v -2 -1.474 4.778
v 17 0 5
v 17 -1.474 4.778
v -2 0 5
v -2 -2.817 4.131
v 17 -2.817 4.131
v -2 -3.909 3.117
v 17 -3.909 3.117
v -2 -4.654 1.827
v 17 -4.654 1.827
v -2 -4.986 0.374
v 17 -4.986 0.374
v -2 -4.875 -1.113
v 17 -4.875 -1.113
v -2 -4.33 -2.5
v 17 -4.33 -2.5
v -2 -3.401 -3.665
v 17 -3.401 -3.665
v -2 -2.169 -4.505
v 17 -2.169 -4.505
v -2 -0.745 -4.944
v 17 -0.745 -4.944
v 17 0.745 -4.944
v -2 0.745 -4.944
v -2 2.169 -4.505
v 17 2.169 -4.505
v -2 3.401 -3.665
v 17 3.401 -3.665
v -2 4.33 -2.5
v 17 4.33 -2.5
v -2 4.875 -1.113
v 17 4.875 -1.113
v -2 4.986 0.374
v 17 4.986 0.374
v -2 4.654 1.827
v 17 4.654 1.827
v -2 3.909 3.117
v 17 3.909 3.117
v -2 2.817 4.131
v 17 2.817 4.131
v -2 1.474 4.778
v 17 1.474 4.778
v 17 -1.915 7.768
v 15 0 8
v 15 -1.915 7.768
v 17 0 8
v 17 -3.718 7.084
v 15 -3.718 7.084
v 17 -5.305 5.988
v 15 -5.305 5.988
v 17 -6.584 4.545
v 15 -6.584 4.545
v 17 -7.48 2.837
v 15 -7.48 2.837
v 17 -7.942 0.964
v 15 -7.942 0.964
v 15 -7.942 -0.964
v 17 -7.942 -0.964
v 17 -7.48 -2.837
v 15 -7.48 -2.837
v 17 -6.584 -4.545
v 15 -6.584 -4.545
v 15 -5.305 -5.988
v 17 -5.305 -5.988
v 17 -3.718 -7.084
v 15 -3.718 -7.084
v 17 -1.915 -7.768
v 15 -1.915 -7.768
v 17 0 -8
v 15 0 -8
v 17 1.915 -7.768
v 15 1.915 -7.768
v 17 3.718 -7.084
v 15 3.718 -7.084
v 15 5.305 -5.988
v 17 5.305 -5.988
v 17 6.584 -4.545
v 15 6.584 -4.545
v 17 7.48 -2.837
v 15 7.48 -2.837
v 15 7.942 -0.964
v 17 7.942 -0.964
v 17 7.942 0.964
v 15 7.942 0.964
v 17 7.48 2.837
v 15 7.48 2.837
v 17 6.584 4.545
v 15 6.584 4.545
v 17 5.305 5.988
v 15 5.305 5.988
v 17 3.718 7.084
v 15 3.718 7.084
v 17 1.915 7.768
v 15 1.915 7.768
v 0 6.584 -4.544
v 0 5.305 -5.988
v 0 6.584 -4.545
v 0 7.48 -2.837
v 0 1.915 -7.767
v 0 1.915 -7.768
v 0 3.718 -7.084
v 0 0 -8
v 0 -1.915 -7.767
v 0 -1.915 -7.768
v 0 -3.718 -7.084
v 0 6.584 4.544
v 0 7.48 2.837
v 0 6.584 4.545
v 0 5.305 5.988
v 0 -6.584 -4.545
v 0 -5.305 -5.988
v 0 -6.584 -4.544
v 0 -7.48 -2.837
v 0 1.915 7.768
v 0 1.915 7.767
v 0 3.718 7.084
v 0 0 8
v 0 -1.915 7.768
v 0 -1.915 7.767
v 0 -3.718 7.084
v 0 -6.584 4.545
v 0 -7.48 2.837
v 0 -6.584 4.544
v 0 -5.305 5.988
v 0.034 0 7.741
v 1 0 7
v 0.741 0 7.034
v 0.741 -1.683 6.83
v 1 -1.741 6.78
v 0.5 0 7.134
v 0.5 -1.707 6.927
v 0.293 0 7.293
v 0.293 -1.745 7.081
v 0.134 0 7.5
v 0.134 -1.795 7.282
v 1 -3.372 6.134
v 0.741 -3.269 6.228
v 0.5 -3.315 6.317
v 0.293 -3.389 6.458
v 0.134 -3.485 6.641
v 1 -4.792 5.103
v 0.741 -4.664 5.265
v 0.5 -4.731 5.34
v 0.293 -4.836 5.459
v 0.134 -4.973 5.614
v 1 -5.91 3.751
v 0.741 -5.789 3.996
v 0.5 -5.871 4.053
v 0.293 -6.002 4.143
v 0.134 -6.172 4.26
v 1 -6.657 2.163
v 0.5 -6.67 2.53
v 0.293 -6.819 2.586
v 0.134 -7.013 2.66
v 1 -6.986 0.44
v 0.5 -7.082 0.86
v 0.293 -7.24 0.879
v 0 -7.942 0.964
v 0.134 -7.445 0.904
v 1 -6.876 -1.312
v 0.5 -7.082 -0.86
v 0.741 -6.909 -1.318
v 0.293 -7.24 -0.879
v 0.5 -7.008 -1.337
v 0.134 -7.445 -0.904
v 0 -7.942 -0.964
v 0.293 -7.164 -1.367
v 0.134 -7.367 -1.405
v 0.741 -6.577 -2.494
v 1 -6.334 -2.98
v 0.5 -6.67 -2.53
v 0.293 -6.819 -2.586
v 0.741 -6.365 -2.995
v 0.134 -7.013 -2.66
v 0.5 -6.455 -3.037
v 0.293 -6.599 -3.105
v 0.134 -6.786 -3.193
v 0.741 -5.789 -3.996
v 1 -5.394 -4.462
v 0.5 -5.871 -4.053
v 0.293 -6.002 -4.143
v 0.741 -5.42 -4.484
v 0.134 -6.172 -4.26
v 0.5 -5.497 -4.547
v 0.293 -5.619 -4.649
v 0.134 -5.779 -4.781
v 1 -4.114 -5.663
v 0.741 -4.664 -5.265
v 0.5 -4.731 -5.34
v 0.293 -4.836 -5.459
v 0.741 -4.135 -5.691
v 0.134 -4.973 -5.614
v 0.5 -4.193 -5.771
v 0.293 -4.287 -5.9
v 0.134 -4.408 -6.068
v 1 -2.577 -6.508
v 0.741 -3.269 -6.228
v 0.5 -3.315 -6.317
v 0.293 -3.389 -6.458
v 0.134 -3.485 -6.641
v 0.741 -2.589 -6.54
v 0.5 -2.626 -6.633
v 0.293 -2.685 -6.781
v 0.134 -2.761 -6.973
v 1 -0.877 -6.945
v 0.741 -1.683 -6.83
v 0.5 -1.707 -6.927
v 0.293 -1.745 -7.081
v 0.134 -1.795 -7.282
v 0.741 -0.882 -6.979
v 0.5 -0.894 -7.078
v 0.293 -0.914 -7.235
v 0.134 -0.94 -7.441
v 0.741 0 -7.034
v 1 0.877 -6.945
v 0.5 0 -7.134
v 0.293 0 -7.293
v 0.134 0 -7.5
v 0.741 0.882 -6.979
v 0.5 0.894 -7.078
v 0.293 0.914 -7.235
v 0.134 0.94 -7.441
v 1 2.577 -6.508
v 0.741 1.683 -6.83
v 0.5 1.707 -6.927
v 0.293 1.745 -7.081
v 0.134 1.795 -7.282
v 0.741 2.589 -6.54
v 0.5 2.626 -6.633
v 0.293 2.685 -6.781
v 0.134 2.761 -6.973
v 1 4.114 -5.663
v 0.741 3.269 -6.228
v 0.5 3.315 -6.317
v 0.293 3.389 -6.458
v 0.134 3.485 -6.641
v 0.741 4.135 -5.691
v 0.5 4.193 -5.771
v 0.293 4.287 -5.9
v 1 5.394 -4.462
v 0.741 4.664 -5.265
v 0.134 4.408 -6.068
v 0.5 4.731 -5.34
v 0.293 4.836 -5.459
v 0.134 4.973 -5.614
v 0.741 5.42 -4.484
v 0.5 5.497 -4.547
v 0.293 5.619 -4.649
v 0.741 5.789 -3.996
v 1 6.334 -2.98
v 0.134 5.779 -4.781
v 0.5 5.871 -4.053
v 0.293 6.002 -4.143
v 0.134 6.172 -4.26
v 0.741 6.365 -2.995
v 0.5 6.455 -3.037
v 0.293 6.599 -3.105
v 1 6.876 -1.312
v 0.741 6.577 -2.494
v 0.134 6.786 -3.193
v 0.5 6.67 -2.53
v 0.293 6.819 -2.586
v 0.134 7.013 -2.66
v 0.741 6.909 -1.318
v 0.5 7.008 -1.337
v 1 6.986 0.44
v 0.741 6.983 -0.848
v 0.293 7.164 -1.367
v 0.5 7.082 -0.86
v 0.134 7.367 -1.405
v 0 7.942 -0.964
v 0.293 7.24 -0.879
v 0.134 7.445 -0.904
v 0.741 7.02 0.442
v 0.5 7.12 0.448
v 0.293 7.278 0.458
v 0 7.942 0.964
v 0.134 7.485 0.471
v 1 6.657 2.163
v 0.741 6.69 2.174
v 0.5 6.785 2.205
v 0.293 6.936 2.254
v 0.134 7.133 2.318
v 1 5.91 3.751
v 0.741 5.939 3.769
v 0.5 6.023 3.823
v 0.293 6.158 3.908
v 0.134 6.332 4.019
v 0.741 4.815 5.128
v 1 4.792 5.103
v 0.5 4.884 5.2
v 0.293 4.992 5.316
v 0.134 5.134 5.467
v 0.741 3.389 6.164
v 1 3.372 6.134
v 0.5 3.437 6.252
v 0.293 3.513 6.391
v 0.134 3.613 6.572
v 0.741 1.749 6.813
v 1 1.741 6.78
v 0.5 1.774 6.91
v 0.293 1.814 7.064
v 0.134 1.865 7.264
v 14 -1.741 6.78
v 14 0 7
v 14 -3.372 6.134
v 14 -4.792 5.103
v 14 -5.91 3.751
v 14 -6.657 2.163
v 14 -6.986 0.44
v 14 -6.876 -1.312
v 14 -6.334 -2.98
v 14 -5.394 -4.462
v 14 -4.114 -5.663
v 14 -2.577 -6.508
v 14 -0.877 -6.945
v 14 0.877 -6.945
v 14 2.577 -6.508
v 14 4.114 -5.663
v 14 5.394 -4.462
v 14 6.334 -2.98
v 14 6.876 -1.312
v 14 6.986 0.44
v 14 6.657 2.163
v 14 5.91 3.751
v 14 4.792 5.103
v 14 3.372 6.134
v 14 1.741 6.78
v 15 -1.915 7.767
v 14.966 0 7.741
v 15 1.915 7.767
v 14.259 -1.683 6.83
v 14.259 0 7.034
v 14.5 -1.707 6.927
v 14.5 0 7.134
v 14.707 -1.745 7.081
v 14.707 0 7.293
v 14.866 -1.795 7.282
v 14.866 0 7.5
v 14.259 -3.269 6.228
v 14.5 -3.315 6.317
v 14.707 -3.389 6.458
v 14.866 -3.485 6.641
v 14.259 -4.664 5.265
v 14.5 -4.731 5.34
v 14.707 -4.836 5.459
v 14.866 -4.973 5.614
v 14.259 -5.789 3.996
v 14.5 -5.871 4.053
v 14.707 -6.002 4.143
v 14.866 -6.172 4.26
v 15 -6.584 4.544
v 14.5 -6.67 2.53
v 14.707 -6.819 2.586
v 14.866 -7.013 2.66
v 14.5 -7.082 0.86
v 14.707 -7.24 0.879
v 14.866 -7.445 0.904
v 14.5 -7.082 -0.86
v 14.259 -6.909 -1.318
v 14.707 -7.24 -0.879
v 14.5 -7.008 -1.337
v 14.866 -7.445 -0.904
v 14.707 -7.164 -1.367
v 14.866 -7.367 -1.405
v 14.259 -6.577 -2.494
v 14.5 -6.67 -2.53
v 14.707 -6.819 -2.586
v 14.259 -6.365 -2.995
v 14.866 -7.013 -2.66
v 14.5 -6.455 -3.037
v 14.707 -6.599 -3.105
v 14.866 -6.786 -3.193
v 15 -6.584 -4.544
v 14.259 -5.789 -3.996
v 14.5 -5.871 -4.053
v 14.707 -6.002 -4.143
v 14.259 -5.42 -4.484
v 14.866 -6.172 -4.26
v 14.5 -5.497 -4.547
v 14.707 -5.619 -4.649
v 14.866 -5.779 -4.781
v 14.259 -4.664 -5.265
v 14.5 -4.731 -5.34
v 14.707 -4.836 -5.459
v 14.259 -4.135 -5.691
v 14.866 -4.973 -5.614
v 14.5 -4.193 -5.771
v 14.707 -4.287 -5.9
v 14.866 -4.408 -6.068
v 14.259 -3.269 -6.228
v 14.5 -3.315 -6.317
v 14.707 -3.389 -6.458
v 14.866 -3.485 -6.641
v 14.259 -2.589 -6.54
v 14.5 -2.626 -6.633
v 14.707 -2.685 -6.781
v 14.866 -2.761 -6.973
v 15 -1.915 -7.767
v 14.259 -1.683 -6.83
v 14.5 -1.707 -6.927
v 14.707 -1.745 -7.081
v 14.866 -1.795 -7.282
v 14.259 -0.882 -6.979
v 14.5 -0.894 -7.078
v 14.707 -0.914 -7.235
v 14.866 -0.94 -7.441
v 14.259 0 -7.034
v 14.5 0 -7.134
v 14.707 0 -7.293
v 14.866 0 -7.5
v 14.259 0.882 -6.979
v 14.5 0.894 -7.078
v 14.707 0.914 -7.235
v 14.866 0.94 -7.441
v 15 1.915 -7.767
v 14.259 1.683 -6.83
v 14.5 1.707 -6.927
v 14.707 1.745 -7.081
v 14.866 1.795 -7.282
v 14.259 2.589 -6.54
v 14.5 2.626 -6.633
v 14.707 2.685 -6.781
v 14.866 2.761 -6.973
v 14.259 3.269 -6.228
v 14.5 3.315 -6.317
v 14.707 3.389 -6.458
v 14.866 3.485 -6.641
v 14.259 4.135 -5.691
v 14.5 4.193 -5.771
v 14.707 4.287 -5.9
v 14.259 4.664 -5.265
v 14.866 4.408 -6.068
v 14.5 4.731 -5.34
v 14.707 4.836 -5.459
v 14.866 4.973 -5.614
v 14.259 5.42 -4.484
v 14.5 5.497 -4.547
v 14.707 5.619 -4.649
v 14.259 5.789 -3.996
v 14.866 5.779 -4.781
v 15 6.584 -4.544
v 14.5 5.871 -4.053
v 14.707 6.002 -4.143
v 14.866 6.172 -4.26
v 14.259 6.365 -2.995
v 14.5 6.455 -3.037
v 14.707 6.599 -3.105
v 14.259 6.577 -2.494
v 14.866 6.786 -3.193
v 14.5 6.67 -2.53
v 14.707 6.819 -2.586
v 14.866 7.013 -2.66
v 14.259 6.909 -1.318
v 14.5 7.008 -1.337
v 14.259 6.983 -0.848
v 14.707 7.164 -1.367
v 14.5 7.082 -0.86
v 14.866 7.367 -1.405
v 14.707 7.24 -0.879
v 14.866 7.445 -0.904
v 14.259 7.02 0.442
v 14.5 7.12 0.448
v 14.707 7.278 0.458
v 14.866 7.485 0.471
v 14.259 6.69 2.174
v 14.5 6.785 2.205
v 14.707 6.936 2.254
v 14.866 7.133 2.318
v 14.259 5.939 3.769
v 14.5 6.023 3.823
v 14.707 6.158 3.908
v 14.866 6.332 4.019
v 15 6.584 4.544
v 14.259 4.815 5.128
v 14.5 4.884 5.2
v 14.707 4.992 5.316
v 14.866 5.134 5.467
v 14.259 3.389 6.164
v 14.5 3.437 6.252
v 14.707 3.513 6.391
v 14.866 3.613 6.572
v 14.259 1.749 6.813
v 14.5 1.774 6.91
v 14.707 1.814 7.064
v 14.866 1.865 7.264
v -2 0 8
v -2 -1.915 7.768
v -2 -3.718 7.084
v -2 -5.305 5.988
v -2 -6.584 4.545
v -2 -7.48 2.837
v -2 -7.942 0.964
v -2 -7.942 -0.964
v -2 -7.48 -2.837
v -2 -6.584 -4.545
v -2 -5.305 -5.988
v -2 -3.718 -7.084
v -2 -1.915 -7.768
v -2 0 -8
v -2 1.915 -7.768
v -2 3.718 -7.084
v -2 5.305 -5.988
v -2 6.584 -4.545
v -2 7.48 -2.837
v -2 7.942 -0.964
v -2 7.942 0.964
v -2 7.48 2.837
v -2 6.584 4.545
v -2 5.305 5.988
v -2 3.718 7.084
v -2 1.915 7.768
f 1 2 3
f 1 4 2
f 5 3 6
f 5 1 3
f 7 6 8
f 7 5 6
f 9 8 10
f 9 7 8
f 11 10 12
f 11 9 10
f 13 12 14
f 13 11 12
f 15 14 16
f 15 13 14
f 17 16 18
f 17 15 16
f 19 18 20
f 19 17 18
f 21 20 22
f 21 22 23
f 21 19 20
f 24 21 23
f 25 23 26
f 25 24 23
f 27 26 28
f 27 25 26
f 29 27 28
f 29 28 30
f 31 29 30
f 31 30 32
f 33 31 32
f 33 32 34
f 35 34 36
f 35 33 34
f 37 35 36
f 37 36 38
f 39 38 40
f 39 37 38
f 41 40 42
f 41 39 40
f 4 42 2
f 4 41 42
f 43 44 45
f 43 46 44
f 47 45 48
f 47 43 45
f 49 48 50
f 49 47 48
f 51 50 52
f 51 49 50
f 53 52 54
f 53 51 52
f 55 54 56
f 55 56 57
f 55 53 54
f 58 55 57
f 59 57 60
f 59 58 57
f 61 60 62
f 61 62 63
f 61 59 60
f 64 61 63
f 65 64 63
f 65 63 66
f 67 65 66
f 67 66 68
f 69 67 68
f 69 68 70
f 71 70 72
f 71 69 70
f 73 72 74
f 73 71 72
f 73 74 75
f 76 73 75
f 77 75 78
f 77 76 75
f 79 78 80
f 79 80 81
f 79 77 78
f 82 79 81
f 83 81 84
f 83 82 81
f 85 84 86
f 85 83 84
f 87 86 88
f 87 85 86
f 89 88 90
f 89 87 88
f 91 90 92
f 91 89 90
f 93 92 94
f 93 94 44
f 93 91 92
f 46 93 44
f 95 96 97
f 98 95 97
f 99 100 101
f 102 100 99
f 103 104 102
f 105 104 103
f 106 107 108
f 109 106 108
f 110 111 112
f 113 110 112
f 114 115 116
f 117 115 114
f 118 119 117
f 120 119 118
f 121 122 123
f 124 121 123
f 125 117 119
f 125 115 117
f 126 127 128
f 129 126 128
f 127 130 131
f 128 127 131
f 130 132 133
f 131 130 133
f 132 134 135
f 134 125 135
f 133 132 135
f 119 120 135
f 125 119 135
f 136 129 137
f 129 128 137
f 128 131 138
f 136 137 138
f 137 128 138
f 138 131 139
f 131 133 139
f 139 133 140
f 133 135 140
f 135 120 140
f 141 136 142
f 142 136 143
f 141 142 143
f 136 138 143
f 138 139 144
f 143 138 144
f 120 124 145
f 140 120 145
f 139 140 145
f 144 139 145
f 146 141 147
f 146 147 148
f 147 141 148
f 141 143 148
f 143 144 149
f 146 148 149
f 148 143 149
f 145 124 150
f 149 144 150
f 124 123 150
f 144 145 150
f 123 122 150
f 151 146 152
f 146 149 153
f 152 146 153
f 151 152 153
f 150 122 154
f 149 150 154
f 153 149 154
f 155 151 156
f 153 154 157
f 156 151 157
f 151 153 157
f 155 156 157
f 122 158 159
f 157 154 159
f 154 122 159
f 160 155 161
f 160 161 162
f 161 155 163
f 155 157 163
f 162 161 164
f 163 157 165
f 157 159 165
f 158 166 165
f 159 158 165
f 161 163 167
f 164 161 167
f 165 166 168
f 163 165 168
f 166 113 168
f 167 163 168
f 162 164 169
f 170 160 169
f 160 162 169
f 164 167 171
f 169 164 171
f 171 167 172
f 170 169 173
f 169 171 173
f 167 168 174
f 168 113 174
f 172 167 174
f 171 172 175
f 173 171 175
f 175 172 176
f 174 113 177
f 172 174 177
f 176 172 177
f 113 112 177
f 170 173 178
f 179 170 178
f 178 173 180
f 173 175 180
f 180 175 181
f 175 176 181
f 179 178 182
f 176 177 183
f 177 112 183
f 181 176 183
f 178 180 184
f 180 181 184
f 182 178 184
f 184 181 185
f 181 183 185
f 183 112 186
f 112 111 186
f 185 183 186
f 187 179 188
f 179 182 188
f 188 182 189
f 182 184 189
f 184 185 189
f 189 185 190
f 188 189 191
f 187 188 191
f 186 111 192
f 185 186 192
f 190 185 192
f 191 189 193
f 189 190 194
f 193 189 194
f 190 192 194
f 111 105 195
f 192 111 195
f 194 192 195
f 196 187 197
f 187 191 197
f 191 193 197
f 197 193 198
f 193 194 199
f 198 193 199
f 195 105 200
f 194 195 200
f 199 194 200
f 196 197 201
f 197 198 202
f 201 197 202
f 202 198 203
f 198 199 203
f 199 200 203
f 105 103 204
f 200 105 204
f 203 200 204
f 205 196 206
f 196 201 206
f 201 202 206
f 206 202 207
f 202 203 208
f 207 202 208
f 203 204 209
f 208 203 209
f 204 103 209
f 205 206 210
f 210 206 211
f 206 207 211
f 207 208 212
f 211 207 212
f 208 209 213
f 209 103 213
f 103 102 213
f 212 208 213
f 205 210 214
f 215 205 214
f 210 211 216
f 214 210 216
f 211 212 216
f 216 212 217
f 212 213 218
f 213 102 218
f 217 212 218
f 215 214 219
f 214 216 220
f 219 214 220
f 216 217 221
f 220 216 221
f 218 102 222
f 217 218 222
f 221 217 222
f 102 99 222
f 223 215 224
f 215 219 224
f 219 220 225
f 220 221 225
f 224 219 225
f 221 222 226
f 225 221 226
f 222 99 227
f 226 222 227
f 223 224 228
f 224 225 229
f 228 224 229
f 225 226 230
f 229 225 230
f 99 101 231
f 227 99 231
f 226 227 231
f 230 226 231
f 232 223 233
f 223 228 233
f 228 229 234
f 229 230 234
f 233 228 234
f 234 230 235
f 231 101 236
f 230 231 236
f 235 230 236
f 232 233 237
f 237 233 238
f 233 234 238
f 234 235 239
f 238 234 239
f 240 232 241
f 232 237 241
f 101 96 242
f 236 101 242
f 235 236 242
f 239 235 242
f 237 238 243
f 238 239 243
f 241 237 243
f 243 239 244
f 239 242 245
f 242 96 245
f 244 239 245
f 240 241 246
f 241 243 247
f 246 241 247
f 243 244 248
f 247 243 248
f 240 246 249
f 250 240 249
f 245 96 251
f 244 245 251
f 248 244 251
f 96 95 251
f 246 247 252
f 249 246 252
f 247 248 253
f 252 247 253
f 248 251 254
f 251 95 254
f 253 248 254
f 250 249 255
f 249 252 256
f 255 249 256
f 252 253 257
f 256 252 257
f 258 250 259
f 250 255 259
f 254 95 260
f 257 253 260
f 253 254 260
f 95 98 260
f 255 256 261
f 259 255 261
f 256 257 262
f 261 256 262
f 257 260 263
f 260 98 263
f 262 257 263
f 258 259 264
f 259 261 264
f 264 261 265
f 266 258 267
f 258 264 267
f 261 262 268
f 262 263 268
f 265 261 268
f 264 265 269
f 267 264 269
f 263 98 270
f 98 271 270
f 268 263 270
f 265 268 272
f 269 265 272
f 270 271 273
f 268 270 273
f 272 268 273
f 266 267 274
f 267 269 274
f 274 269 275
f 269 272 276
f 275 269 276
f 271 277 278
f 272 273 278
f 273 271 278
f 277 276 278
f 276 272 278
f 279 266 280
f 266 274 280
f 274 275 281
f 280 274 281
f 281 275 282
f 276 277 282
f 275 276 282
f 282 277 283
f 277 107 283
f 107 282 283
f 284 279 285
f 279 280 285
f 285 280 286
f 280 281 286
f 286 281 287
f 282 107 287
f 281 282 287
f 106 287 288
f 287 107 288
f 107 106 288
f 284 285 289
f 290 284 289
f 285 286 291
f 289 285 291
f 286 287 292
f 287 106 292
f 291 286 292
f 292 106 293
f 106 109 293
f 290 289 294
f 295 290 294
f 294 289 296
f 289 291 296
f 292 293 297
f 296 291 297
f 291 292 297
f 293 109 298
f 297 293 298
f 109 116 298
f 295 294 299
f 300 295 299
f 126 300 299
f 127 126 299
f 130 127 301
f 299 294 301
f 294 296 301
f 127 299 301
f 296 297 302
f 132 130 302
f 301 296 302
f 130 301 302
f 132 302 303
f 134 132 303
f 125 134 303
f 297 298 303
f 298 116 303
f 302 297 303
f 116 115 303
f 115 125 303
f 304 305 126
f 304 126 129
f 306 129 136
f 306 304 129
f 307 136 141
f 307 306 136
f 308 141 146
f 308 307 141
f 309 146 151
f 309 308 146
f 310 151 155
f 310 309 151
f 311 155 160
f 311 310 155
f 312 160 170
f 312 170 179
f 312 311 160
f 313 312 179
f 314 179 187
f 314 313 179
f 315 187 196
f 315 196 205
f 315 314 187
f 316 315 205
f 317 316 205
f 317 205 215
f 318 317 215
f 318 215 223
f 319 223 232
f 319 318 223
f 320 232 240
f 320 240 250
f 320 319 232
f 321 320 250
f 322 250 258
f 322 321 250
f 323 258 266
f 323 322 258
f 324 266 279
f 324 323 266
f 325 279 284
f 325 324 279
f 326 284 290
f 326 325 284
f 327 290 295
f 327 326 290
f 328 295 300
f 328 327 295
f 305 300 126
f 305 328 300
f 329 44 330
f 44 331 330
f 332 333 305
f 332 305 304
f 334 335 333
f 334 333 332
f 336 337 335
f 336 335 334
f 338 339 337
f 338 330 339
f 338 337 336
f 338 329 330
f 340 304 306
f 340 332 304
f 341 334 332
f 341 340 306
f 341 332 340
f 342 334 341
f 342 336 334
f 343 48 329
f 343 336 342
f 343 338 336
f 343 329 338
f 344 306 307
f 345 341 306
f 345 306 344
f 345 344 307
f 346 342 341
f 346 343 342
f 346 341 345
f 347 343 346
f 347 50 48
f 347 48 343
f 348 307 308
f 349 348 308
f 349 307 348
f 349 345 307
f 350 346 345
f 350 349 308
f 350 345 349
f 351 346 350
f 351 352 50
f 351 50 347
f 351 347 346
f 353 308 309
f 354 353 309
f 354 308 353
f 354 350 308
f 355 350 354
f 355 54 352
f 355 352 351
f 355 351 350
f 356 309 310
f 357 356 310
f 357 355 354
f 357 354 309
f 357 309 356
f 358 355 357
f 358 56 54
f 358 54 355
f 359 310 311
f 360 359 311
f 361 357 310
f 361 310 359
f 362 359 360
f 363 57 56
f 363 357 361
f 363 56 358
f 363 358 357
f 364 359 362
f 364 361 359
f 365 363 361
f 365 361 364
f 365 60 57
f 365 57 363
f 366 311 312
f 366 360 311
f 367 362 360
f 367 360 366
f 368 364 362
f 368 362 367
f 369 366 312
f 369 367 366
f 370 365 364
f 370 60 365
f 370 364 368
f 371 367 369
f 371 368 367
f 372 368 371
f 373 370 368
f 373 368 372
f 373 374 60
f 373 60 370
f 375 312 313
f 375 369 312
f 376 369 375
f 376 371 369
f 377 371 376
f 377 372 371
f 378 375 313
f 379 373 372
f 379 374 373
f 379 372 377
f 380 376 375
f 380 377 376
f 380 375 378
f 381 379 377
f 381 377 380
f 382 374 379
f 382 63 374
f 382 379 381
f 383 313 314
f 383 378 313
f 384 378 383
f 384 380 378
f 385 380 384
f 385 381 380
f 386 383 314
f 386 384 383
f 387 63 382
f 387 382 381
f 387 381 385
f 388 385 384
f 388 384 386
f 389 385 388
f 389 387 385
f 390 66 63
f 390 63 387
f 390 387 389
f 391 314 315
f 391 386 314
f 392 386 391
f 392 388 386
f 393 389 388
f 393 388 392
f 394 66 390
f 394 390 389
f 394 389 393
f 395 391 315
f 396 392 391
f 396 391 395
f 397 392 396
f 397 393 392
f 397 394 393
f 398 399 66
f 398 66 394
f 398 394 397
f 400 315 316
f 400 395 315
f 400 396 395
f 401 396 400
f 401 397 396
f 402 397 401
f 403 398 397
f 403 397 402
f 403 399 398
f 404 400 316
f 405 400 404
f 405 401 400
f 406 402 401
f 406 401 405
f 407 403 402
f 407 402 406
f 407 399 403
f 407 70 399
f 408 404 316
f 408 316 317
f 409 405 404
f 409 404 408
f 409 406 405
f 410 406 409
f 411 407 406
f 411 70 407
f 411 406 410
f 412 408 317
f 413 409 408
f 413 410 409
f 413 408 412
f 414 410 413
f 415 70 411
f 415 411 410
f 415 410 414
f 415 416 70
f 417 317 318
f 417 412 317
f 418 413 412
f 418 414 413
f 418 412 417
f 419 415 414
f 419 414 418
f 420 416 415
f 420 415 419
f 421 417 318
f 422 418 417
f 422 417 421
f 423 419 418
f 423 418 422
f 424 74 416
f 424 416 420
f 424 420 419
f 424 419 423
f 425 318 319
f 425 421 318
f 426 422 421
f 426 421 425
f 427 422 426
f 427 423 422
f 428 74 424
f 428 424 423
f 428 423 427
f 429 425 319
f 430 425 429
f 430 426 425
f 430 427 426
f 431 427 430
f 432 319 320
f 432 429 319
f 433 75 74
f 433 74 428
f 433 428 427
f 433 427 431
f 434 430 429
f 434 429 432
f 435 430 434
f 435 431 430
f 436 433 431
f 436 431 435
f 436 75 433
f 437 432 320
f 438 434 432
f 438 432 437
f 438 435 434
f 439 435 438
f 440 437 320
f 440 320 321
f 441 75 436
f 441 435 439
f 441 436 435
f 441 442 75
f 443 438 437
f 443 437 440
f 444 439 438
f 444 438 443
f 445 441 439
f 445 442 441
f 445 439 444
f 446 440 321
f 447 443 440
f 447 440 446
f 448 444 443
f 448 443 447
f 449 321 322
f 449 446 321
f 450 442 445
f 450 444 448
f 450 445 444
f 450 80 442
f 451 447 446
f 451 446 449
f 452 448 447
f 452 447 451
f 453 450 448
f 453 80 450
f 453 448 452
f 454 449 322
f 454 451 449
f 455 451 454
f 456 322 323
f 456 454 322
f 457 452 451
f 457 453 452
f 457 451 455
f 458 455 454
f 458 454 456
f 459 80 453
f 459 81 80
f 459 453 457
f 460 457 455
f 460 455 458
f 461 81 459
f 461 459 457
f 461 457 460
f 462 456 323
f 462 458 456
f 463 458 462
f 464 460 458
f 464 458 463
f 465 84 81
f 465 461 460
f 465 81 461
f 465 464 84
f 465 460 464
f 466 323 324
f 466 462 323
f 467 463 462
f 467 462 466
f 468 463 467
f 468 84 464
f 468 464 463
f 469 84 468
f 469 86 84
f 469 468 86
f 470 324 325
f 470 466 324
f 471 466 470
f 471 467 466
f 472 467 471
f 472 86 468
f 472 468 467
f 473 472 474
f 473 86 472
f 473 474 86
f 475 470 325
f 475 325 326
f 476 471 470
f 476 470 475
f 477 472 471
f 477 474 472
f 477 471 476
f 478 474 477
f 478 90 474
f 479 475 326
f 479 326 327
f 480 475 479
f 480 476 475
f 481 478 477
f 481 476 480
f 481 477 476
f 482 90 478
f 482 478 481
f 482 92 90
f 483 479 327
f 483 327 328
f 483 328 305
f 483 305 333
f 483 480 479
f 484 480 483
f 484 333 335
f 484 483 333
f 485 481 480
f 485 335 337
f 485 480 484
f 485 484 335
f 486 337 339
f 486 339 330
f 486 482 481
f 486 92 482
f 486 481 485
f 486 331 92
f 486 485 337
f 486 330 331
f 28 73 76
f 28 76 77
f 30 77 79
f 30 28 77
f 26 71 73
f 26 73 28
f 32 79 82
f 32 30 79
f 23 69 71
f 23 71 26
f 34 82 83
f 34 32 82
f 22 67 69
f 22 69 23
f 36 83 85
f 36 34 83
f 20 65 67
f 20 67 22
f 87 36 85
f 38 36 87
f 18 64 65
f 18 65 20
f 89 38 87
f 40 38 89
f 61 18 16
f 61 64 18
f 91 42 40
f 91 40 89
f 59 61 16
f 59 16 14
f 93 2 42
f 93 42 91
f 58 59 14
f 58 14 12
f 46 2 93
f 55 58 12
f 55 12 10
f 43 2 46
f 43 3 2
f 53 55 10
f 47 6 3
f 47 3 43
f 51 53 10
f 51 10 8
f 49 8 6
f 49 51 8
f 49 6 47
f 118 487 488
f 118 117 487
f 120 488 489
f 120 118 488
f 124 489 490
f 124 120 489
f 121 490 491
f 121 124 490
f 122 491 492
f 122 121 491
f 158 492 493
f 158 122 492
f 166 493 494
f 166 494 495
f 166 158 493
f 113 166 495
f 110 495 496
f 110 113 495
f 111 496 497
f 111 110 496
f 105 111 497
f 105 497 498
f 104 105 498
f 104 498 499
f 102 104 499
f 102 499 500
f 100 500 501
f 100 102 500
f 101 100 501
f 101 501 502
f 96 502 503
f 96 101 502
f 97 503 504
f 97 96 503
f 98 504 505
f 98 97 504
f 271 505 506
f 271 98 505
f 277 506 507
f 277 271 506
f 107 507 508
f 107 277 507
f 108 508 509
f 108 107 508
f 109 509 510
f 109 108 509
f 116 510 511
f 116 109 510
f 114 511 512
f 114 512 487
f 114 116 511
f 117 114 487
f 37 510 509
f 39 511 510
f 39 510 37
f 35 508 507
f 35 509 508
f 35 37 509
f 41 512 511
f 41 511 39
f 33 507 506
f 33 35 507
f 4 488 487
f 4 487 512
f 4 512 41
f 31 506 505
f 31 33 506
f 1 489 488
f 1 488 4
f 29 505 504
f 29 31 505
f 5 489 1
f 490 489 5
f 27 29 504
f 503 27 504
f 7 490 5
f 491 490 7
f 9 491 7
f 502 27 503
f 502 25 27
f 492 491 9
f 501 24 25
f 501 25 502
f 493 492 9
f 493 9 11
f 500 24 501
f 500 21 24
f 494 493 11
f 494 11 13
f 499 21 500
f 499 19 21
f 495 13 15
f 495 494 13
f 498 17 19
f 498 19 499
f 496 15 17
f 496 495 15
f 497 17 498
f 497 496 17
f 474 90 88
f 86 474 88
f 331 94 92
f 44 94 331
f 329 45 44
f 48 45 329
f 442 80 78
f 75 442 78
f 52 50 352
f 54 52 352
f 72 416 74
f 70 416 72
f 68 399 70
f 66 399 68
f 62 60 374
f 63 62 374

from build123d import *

# Parameters (mm, degrees)
FILLET1_R = 1


with BuildPart() as part:
    # Sketch1 → Revolve1 (revolve)
    with BuildSketch(Plane(origin=(0, 0, 0), x_dir=(1, 0, 0), z_dir=(0, 1, 0)), mode=Mode.PRIVATE) as revolve1_sk:
        Polygon((0, 7), (15, 7), (15, 8), (17, 8), (17, 5), (-2, 5), (-2, 8), (0, 8), align=None)
    revolve(revolve1_sk.sketch.rotate(Axis((0, 0, 0), (1, 0, 0)), 180), axis=Axis((0, 0, 0), (1, 0, 0)))

    # Fillet1
    fillet1_edges = [part.edges().sort_by_distance(p)[0] for p in [
        (0, 0, -7),
        (15, 0, -7),
    ]]
    fillet(fillet1_edges, radius=FILLET1_R - 0.0001)  # a hair under: the kernel refuses the full size


solid = part.part
